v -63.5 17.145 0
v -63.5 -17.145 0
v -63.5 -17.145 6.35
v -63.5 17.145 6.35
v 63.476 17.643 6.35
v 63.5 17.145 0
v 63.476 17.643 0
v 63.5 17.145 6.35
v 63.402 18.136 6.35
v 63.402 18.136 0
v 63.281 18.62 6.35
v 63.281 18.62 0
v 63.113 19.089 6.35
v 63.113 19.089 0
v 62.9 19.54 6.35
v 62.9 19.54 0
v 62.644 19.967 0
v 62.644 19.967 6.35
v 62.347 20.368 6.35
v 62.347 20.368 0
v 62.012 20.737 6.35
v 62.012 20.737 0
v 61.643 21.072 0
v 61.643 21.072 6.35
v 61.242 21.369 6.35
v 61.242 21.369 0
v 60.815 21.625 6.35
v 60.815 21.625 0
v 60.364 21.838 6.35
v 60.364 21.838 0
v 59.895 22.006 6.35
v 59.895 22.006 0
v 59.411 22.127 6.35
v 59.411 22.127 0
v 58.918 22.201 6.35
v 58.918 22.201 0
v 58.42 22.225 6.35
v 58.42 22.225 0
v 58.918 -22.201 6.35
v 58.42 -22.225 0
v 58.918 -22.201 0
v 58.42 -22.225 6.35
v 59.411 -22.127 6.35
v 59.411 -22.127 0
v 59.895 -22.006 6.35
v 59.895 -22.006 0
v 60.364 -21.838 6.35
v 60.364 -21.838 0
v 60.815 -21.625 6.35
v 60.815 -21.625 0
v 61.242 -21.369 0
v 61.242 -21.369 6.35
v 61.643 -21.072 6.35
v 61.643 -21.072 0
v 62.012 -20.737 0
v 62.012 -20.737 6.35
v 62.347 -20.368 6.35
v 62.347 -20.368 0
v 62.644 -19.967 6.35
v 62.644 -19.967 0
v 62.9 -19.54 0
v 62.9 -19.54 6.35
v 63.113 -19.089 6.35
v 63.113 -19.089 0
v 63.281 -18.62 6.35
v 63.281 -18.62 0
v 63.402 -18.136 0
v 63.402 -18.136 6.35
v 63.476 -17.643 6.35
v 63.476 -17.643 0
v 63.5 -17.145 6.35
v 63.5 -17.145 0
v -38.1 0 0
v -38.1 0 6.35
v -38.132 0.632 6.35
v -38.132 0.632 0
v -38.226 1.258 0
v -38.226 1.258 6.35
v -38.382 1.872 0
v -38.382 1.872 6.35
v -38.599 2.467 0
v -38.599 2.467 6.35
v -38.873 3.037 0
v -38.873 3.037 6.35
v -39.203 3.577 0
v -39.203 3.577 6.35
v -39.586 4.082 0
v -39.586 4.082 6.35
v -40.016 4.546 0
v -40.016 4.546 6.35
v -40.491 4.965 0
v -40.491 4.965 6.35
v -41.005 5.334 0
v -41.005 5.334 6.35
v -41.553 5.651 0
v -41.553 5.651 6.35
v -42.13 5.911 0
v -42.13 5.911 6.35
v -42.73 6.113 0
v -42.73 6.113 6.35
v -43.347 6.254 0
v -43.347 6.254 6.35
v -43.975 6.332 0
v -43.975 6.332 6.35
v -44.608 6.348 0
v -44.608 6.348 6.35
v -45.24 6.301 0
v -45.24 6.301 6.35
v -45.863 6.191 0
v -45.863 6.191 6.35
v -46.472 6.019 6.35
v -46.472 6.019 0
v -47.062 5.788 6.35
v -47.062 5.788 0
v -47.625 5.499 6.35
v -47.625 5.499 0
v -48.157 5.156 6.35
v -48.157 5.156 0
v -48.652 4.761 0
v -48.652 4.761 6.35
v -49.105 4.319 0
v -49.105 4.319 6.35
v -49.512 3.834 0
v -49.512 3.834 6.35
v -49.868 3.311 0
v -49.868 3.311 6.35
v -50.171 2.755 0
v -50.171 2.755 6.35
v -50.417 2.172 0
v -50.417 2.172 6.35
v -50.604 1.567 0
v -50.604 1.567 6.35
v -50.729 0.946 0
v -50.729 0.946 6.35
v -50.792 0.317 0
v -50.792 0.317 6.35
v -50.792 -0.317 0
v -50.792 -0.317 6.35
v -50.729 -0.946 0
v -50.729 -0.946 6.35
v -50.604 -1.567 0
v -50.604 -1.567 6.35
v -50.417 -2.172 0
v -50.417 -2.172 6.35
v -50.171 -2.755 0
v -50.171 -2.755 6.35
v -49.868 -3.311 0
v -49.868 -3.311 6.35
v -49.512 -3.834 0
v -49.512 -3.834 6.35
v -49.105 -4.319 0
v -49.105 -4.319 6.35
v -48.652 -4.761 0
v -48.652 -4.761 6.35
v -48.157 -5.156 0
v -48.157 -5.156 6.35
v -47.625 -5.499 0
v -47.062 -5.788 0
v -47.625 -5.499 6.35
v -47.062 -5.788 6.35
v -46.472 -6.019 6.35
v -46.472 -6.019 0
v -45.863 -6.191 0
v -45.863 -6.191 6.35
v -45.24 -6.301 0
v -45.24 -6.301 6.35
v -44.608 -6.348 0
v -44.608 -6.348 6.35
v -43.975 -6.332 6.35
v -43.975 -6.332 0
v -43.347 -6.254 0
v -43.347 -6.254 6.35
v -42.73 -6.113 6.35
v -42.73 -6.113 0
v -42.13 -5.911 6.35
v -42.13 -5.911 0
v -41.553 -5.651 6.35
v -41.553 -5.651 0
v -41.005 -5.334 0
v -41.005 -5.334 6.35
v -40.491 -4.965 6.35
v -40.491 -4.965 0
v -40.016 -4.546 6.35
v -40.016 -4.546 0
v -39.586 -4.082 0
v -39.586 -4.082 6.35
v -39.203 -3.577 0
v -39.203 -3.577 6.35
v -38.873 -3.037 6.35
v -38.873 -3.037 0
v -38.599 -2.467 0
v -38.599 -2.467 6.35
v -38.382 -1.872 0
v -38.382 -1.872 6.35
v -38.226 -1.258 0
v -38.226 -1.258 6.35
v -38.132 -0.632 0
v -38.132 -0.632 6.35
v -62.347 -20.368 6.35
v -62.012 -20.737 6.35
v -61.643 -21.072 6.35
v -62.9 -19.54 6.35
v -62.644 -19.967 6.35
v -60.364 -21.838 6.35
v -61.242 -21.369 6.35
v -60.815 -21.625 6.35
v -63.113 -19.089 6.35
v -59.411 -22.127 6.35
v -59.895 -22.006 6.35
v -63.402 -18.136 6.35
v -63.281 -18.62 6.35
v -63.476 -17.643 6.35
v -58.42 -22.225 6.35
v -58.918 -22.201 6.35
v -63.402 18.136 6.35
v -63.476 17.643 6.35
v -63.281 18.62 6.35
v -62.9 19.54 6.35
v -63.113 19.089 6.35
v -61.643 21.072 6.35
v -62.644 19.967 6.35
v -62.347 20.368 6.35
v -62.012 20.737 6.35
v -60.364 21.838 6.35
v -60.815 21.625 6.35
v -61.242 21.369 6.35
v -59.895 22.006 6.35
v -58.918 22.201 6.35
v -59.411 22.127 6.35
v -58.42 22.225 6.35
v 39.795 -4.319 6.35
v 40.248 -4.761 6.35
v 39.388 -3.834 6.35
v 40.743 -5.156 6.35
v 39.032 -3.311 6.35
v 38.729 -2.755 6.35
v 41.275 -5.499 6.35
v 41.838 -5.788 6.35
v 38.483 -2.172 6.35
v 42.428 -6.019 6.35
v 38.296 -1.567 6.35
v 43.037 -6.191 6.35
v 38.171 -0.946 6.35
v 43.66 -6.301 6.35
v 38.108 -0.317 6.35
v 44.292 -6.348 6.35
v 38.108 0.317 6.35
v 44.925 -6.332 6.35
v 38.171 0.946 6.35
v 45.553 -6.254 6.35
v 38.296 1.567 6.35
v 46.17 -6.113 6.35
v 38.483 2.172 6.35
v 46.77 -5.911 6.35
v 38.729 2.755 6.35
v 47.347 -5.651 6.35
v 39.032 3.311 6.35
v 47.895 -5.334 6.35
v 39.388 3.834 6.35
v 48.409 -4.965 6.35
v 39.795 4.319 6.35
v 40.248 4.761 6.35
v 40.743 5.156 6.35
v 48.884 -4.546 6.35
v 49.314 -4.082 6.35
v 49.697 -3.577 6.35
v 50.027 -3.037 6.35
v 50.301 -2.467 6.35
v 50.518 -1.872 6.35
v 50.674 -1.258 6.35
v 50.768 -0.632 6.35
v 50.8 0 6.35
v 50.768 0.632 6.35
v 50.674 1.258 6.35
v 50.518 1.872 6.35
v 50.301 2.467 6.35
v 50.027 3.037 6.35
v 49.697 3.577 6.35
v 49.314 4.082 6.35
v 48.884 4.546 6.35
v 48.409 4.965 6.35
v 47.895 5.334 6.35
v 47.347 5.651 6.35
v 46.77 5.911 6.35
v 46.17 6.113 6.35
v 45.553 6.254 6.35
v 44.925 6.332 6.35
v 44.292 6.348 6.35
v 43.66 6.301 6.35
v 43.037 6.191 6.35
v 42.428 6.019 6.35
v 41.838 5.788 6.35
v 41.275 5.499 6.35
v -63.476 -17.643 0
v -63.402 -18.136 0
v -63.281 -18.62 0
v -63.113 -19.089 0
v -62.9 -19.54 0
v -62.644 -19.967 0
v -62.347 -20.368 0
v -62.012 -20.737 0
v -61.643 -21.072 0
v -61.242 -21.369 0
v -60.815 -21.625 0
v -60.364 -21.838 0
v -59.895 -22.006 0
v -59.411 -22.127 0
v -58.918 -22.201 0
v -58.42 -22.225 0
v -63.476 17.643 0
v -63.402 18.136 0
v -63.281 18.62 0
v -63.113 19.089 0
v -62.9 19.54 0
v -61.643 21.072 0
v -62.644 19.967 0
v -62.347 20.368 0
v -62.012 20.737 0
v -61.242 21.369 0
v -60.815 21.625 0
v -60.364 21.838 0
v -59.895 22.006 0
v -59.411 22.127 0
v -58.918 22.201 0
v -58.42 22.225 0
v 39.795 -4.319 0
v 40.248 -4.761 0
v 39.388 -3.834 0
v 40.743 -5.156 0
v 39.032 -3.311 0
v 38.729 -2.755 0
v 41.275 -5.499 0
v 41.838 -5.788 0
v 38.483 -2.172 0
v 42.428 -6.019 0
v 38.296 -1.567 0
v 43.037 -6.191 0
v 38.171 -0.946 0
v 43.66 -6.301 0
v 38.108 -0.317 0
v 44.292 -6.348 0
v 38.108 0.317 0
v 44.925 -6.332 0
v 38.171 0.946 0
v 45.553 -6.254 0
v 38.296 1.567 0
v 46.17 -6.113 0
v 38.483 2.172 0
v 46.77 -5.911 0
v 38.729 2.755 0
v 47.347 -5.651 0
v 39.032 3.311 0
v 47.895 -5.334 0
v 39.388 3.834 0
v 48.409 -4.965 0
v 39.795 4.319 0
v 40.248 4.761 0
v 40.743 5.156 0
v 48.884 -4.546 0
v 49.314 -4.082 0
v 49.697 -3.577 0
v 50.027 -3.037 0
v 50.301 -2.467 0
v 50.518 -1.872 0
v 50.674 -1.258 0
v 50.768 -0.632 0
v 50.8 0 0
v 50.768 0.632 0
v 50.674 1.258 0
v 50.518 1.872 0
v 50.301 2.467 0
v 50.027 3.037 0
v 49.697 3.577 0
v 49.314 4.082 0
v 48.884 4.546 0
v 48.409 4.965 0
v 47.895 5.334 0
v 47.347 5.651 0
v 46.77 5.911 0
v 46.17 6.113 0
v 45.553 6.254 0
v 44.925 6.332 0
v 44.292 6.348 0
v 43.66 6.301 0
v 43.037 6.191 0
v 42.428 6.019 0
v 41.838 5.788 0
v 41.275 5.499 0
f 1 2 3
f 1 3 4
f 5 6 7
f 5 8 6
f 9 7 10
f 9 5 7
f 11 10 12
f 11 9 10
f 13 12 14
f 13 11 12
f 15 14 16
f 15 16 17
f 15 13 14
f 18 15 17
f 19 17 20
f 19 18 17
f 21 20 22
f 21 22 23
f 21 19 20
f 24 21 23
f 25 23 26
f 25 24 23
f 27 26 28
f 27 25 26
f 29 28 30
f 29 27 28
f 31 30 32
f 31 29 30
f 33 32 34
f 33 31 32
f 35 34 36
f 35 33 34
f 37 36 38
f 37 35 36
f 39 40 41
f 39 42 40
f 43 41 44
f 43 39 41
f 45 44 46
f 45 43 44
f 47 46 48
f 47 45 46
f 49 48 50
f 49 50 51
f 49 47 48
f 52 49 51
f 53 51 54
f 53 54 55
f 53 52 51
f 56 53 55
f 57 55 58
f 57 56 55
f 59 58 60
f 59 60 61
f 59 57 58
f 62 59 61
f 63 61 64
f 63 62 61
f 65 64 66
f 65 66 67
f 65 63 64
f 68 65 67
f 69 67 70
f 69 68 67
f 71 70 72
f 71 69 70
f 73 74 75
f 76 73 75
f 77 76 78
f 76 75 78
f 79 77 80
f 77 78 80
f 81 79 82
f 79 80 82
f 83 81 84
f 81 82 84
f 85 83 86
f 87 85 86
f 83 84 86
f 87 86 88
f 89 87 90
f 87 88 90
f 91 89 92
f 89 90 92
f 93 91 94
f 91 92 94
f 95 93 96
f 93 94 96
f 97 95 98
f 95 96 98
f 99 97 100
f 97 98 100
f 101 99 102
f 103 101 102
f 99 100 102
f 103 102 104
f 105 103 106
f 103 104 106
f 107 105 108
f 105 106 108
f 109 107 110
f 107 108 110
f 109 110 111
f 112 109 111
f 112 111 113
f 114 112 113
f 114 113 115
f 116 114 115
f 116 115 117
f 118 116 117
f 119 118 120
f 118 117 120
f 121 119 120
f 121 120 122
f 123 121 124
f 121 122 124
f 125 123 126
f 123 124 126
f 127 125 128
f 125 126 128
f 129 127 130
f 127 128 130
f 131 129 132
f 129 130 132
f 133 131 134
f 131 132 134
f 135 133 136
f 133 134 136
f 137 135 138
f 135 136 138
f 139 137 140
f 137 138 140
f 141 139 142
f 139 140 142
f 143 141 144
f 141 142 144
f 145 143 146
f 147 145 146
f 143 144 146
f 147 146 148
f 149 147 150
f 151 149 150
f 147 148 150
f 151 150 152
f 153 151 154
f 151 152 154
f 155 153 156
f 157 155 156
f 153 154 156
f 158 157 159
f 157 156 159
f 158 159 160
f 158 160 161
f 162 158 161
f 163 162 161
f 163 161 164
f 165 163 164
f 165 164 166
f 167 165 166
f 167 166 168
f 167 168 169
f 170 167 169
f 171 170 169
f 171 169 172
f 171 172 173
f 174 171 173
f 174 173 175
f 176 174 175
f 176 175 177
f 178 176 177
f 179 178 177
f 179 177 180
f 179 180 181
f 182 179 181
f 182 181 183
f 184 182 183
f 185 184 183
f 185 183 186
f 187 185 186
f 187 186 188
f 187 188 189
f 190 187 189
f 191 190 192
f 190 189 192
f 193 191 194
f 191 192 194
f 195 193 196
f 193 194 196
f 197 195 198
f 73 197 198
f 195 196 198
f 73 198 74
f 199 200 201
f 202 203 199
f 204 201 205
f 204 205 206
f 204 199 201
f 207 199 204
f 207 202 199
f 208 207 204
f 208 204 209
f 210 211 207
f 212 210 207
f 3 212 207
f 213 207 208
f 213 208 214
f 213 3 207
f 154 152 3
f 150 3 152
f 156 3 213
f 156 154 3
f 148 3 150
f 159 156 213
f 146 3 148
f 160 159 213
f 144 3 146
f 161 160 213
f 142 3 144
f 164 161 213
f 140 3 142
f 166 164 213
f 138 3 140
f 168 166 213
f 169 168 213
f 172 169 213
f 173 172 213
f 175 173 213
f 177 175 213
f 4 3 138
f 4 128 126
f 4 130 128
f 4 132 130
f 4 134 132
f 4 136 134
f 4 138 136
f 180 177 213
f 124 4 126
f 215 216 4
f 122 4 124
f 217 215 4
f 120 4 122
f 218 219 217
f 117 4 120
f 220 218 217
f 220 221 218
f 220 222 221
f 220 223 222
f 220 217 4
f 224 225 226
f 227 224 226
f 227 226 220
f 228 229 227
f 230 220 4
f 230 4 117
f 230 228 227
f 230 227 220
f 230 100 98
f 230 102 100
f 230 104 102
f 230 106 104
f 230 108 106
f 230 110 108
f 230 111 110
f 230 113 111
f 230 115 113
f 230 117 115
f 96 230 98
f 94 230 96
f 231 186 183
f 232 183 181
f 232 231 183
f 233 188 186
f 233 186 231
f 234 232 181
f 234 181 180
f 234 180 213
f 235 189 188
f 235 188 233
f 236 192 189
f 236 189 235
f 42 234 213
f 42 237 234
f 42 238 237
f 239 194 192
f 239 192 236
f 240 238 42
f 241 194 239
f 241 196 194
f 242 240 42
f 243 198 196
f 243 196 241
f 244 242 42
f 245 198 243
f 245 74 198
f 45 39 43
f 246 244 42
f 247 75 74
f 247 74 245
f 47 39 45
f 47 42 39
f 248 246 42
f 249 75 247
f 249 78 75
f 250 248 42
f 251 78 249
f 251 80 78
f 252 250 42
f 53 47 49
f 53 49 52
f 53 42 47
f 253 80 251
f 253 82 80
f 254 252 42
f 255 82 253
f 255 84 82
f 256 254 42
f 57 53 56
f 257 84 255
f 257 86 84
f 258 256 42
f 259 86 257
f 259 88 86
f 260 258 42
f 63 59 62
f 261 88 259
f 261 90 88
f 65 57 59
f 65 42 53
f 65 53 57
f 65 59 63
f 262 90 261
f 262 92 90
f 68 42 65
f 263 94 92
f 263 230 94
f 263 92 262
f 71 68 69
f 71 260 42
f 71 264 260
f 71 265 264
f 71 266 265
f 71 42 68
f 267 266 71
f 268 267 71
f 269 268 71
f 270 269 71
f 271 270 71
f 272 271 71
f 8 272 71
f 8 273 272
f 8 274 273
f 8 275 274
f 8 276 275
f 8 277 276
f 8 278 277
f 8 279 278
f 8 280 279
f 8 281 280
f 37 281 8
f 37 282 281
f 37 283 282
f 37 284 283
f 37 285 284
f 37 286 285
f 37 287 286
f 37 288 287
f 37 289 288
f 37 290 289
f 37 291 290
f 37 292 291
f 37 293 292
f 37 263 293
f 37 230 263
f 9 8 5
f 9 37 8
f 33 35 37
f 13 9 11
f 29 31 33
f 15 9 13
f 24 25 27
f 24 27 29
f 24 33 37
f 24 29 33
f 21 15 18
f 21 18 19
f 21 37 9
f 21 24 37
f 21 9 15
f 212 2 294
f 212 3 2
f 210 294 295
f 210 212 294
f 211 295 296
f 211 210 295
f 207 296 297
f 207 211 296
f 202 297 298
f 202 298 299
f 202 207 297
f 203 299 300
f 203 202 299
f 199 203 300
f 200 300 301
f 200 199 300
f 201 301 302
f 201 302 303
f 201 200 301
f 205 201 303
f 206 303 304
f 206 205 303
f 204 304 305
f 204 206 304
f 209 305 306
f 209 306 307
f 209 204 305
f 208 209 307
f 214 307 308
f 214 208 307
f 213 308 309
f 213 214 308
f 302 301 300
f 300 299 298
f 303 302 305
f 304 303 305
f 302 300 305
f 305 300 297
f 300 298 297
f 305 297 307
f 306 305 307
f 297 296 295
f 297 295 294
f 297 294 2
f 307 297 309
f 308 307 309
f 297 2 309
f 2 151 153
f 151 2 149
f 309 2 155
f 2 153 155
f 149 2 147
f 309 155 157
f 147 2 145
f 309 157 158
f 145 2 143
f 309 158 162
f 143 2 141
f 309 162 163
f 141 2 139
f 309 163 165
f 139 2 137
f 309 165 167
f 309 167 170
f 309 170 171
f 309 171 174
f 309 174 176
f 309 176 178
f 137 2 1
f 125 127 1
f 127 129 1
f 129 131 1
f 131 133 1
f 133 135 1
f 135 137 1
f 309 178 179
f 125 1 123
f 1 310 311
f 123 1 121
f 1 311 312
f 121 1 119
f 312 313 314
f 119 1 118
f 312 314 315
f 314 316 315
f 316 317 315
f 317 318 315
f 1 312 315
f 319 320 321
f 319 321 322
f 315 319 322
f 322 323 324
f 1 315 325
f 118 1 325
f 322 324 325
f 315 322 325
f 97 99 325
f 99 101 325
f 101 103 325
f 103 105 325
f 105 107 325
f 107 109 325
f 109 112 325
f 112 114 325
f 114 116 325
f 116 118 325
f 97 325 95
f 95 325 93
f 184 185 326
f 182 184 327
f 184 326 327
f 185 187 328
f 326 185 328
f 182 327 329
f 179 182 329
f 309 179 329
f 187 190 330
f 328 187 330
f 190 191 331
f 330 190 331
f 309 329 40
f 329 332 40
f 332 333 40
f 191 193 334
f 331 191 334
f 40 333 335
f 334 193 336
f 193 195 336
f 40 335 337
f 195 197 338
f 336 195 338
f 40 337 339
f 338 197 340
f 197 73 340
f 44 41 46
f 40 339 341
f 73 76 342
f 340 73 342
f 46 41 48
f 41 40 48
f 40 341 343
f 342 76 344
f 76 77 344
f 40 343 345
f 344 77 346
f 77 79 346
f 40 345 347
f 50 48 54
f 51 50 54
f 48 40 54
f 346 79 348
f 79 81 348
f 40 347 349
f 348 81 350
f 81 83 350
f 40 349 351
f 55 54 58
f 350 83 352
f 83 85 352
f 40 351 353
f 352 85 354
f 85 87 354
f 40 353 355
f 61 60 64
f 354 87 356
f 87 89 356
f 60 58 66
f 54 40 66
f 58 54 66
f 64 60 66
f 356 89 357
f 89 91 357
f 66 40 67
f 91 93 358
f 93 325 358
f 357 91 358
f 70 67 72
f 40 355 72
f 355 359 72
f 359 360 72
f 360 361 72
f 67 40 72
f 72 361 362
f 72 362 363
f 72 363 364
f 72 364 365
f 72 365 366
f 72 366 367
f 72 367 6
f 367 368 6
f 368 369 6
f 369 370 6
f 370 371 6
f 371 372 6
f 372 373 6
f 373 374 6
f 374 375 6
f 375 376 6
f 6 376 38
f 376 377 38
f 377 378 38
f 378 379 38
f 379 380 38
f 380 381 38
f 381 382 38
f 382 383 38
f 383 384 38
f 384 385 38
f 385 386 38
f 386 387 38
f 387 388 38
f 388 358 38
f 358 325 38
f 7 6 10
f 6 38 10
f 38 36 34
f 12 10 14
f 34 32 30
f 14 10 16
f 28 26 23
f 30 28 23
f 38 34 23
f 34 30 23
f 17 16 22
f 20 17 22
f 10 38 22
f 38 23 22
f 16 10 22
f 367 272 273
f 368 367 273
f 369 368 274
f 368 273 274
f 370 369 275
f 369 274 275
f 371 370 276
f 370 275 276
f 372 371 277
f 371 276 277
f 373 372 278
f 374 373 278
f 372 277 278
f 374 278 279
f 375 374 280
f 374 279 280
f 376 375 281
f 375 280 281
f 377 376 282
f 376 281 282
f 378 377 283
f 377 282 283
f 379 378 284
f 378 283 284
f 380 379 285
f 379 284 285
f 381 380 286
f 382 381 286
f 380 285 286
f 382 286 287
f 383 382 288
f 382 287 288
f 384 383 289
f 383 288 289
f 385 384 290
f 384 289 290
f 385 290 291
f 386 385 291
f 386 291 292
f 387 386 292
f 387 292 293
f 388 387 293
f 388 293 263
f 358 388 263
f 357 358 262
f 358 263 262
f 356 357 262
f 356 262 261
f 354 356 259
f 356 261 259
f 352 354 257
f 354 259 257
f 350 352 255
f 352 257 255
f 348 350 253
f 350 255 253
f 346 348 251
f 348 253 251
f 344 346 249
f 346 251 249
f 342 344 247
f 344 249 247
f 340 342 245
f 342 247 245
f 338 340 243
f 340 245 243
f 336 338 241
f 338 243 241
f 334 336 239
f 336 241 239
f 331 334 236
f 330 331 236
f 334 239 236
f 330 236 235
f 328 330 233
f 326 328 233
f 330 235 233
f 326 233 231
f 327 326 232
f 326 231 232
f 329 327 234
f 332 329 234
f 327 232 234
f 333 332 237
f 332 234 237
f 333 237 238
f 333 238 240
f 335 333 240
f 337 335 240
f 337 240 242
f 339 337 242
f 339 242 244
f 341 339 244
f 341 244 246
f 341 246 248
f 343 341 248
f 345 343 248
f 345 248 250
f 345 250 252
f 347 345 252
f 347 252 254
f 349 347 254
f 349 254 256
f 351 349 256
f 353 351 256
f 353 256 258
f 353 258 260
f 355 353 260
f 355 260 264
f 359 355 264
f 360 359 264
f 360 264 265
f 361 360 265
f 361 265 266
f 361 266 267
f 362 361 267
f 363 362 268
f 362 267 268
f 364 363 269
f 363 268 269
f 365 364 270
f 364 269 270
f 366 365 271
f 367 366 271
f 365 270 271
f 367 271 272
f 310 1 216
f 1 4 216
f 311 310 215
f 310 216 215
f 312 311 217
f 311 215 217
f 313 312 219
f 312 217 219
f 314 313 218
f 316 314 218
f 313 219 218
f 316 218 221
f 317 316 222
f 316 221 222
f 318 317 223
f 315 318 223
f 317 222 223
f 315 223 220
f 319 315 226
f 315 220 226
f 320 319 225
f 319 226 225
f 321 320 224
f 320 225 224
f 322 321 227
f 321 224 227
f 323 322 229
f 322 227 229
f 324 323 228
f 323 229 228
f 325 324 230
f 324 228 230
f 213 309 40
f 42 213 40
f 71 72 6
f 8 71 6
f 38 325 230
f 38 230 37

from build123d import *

# Parameters (mm, degrees)
F0_W     = 127
F0_H     = 44.45
F1_DEPTH = 6.35
F2_R     = 5.08
F3_R     = 6.35
F4_DEPTH = 6.35


with BuildPart() as f1:
    # F0 (on Top) → F1 (new body)
    with BuildSketch(Plane.XY):
        Rectangle(F0_W, F0_H)
    extrude(amount=F1_DEPTH)

    # F2
    f2_edges = [f1.edges().sort_by_distance(p)[0] for p in [
        (63.5, -22.225, 3.175),
        (63.5, 22.225, 3.175),
        (-63.5, -22.225, 3.175),
        (-63.5, 22.225, 3.175),
    ]]
    fillet(f2_edges, radius=F2_R)

    # F3 (on face) → F4 (cut, through all)
    with BuildSketch(Plane.XY.offset(6.35)):
        with Locations((-44.45, 0)):
            Circle(F3_R)
        with Locations((44.45, 0)):
            Circle(F3_R)
    extrude(amount=-F4_DEPTH, mode=Mode.SUBTRACT)


solid = f1.part
